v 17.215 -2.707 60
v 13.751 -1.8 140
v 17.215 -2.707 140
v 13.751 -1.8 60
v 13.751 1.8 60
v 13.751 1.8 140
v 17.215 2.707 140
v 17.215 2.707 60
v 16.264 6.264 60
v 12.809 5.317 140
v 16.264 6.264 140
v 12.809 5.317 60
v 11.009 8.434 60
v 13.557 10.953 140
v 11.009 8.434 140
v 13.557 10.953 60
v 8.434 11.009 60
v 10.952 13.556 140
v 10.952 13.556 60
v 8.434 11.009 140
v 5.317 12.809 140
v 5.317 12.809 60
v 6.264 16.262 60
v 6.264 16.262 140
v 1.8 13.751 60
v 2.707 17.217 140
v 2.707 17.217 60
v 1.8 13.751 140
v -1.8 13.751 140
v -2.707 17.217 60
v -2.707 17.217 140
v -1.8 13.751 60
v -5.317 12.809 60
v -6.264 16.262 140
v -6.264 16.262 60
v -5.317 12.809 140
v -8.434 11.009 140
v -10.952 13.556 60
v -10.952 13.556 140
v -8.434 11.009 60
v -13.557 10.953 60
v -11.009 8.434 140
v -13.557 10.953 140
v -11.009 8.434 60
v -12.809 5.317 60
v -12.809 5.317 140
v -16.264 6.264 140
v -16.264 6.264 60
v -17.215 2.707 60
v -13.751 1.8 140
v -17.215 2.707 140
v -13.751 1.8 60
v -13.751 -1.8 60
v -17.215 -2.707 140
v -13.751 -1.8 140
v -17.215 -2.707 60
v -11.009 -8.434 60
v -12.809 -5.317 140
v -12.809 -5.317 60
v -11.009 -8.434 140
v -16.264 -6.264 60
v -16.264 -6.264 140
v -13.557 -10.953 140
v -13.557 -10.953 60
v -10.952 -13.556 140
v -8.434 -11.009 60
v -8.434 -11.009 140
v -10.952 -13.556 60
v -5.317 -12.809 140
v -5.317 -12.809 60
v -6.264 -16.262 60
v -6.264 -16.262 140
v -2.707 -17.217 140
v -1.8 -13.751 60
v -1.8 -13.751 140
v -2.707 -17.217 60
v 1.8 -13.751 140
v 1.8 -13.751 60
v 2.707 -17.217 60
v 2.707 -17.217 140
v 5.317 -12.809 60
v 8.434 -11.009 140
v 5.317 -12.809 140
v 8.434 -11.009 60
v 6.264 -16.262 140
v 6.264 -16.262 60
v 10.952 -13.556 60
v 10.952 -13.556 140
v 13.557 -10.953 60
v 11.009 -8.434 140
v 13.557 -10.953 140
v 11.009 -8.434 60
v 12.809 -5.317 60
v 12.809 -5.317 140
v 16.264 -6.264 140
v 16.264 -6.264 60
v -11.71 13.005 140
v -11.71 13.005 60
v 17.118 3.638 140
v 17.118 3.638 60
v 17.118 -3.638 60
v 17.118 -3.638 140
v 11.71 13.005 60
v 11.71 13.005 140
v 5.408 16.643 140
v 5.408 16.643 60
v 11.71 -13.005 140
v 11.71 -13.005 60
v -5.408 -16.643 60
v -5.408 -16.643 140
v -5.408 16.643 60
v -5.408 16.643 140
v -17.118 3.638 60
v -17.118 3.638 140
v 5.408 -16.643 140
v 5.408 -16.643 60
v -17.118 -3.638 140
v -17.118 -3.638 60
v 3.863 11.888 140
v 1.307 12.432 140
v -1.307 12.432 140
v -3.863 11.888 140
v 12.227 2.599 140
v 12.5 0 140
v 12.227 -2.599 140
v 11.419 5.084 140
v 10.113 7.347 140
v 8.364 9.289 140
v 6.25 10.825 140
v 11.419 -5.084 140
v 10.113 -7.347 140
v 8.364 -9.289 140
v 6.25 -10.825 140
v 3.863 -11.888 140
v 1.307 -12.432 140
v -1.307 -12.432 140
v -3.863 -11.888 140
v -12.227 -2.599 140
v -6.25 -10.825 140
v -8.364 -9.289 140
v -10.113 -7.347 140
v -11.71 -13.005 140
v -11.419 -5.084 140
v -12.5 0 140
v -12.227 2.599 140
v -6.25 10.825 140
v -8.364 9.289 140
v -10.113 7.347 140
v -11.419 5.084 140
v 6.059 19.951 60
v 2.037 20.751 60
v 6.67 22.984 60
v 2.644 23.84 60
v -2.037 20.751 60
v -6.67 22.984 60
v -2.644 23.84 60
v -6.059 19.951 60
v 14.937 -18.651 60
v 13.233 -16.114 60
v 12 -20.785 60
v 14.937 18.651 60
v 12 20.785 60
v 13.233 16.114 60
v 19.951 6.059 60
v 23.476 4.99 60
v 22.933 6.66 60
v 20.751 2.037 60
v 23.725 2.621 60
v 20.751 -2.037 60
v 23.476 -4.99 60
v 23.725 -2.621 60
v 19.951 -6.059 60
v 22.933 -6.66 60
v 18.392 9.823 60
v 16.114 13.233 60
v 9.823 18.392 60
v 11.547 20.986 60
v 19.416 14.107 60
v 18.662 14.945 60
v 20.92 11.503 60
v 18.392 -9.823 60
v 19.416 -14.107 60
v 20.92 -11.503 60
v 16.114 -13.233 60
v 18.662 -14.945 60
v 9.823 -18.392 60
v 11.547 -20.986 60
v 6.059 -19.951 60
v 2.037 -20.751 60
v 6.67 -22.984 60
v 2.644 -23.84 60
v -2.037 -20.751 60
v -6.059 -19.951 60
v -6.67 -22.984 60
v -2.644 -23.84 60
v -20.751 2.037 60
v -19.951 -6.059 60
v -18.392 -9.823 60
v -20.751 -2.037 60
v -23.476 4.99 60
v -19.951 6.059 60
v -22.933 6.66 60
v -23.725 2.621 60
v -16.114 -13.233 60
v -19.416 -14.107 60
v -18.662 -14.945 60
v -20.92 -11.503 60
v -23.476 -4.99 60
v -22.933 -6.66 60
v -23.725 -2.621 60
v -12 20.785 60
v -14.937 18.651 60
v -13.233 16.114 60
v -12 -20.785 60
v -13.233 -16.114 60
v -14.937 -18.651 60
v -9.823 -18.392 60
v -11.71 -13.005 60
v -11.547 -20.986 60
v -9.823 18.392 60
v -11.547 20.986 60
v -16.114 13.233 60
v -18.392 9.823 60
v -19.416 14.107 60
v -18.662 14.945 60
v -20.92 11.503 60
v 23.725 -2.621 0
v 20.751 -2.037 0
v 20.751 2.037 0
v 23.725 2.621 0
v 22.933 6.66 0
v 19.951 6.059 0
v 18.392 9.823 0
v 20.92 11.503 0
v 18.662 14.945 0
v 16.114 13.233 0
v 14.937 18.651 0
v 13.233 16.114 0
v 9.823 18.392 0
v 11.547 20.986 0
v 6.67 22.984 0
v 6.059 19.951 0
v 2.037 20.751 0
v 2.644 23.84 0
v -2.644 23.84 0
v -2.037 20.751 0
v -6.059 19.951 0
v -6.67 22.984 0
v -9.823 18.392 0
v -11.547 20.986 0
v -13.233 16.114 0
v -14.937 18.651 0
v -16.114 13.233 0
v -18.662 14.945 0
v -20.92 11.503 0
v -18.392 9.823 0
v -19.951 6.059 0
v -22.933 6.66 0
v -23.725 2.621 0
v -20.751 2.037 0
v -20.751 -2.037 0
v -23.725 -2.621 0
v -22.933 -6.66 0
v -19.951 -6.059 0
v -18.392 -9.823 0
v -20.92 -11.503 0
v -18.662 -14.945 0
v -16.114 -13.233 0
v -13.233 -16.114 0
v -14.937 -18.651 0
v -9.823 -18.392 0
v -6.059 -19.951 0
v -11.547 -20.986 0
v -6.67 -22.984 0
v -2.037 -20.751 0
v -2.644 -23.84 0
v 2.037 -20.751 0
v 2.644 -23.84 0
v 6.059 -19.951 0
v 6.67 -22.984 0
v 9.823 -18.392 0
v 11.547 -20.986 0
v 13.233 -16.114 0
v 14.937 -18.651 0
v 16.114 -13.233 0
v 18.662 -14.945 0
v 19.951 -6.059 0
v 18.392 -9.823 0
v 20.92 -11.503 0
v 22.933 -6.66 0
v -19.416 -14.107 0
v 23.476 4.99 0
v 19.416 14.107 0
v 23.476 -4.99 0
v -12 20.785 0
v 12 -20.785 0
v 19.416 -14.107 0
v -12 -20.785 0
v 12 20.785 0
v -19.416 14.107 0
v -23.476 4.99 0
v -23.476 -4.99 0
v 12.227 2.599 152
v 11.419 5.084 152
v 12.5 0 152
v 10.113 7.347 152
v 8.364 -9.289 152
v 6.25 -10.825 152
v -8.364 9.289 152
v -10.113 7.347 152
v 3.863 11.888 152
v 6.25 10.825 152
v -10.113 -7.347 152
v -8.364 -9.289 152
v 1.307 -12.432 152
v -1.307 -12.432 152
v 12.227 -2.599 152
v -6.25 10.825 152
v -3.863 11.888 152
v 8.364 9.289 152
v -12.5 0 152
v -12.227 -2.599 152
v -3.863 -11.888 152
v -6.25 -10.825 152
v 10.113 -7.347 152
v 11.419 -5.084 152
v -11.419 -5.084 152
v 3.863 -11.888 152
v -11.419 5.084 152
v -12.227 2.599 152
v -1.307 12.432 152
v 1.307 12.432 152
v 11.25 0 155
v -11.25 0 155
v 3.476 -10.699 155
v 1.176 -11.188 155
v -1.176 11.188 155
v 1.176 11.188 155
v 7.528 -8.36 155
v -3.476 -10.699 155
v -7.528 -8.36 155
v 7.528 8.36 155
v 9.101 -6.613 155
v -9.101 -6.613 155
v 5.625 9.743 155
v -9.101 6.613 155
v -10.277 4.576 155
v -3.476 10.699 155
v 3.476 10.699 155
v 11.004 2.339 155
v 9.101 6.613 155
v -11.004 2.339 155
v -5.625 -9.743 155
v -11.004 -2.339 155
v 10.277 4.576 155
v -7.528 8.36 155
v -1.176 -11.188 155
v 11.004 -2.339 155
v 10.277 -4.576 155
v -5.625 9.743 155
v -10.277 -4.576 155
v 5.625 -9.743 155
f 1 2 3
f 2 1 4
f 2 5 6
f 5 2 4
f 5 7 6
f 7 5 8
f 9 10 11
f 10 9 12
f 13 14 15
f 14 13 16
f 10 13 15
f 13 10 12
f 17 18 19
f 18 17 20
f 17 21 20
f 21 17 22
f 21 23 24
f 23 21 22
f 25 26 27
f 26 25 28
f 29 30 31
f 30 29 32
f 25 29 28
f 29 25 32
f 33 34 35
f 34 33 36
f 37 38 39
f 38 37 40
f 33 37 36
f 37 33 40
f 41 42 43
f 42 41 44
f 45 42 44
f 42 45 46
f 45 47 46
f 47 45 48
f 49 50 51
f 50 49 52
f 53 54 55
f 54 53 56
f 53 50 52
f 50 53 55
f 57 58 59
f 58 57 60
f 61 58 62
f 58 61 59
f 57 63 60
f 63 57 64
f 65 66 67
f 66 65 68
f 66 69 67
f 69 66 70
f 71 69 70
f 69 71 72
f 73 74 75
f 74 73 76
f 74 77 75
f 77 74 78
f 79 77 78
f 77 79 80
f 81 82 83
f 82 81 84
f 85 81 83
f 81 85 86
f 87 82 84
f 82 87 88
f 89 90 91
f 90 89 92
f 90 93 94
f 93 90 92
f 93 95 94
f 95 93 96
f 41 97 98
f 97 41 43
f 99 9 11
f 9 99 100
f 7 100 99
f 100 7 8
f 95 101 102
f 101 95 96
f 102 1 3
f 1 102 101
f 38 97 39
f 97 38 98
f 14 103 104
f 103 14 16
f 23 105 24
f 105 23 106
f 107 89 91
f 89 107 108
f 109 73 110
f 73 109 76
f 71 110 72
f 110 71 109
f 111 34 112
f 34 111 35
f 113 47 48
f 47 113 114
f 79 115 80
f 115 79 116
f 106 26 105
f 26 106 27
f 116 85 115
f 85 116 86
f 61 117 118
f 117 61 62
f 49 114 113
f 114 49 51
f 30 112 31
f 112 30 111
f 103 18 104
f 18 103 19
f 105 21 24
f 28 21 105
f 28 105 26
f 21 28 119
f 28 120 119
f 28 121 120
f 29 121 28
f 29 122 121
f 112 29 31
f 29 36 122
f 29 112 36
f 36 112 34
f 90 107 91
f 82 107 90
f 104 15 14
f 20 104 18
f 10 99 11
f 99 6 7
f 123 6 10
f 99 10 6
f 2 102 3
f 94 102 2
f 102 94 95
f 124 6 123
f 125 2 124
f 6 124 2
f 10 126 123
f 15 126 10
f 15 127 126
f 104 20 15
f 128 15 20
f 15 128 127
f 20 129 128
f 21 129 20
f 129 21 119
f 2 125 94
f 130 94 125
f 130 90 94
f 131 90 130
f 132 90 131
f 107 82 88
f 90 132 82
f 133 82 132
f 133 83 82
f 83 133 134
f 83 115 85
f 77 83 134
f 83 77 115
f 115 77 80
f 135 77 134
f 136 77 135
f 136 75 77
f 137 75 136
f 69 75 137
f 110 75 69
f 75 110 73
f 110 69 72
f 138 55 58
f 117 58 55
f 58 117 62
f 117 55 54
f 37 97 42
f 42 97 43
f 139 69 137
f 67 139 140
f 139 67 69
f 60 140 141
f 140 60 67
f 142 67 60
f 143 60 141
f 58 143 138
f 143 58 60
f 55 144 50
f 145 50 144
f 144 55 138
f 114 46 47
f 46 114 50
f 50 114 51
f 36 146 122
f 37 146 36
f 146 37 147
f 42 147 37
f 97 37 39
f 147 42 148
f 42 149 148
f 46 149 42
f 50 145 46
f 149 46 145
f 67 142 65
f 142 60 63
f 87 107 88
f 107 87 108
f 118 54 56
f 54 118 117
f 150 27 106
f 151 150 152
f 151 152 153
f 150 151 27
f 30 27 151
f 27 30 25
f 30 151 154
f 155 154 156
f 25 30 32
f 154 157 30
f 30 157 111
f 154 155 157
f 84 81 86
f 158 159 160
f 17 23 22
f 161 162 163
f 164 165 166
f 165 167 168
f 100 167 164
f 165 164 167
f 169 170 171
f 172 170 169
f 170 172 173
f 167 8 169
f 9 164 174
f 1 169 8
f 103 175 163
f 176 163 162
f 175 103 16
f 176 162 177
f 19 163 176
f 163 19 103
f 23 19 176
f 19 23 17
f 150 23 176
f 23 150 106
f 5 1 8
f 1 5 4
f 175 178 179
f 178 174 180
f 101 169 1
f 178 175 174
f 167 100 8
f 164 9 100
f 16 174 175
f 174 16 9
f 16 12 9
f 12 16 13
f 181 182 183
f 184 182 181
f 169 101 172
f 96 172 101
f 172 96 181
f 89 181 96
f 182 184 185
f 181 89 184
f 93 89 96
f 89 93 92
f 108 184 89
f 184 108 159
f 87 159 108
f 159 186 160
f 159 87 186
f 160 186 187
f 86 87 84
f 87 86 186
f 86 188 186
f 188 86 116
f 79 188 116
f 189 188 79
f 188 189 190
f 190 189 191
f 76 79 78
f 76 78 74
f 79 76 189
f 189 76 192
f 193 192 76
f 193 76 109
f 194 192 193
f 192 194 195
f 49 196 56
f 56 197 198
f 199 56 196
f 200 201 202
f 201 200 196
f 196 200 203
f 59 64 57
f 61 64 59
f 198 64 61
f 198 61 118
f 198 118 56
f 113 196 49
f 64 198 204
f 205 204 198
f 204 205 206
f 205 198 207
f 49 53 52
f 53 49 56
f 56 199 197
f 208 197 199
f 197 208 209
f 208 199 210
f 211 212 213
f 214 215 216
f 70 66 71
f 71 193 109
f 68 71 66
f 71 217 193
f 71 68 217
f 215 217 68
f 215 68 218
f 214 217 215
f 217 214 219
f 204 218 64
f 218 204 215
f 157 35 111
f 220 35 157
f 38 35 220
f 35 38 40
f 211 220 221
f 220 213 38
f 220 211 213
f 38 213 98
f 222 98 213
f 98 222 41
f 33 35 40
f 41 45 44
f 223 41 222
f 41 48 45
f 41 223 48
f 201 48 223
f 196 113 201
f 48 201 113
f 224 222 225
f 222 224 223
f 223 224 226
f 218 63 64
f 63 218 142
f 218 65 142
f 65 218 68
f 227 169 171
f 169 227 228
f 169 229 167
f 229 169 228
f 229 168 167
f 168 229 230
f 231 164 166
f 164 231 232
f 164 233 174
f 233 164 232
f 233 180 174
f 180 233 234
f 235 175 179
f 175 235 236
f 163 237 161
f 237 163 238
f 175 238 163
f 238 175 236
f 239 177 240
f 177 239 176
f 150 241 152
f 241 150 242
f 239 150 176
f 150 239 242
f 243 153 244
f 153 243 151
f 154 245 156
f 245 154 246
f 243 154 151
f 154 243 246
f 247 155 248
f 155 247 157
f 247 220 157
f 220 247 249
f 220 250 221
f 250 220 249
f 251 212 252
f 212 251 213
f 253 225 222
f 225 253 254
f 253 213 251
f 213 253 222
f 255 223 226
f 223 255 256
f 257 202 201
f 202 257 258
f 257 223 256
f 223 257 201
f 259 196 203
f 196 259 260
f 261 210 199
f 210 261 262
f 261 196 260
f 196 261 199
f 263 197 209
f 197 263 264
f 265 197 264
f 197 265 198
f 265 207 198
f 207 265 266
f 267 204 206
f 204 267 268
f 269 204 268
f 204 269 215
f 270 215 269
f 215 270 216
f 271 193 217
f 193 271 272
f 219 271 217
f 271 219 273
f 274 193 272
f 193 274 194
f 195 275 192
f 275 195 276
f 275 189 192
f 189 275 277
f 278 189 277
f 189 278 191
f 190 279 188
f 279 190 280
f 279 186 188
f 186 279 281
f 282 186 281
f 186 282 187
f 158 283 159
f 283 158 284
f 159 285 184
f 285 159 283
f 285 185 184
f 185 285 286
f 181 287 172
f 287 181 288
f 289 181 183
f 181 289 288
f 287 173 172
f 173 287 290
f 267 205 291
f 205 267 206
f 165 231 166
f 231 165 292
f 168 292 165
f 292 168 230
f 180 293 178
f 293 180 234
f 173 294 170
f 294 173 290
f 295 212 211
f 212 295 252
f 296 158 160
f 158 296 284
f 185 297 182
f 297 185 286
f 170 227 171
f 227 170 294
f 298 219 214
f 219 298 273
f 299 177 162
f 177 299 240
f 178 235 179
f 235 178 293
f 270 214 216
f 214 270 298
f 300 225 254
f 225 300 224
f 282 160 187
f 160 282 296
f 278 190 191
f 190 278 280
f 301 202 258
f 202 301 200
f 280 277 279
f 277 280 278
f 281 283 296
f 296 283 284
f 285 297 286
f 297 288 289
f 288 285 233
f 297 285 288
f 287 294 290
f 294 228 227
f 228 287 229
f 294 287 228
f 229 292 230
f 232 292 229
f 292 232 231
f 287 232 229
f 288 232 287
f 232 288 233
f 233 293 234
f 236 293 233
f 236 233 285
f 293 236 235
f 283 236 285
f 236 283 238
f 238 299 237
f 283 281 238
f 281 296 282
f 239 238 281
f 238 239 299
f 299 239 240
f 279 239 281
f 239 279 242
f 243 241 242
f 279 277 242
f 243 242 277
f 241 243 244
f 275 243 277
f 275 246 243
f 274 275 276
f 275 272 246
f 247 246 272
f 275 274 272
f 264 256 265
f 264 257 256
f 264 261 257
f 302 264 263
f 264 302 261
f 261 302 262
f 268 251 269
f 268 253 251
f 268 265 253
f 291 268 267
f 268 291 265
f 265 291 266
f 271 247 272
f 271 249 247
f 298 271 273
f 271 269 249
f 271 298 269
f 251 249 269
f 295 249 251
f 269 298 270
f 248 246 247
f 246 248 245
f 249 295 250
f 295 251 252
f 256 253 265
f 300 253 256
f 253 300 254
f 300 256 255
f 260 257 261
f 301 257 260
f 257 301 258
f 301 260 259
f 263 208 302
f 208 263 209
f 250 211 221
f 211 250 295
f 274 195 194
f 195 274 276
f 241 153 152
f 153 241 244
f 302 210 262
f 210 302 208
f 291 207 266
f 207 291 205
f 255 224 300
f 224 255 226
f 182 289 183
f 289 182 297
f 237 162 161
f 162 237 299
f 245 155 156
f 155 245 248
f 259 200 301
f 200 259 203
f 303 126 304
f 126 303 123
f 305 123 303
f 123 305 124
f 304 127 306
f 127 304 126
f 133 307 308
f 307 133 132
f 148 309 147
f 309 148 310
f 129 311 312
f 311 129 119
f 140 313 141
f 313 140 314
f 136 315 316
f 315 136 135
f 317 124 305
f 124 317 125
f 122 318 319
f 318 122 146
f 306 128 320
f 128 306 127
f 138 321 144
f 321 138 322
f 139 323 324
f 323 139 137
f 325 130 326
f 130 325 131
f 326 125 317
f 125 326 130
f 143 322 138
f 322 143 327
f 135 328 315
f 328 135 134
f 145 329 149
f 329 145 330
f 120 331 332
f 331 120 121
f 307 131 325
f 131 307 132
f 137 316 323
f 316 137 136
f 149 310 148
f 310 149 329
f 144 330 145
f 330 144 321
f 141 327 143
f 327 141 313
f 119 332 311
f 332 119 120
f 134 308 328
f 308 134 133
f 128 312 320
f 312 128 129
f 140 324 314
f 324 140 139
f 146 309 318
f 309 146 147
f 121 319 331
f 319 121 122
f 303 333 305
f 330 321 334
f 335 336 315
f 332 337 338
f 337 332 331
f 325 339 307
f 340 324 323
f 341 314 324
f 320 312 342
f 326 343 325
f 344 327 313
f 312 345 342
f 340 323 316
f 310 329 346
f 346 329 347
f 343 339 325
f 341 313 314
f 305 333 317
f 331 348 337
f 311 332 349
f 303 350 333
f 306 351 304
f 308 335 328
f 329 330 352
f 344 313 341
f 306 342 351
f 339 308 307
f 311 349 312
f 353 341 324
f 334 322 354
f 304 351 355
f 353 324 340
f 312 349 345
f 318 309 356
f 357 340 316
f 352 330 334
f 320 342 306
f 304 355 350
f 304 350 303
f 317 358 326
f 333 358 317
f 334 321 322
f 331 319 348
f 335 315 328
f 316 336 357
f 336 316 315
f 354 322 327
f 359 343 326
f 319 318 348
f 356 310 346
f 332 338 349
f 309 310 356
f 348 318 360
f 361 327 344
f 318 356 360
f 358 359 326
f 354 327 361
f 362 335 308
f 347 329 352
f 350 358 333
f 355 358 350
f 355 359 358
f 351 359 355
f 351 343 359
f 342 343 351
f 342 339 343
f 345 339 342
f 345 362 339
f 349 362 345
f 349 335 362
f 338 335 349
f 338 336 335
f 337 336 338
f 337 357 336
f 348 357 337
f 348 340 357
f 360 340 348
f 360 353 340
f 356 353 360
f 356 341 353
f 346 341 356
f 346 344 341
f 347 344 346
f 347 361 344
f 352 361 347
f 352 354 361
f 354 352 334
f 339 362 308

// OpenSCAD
// This one better be as fit as possible
spline_major=35;
spline_minor=27.5;
spline_count=12;
// Belarus 1523.4 spline length 78mm
spline_length=80;

spline2_major=48;
spline2_minor=41.5;
spline2_count=16;
// Belarus 1523.4 spline2 length 30mm, but we need more as handle
spline2_length=60;


// Bearing iD = 25
pilot_diam=25;
pilot_guide_length_percent=20;
pilot_length=15;

// Not really useful for 1523.4
handle_length=0;

total_length = spline2_length+spline_length+handle_length+pilot_length;
echo (concat("Total length: ", total_length));

// 1523.4 clutch mechanism (splines) is about 110mm in length
usable_length = spline2_length+spline_length;
echo (concat("Total spline length: ", usable_length));

// HANDLE
cylinder(r=spline2_major/2, h=handle_length);

// BOTTOM SPLINE
translate([0,0,handle_length+spline2_length])
    spline(spline_major, spline_minor, spline_count, spline_length);
// TOP SPLINE
translate([0,0,handle_length])
    spline(spline2_major, spline2_minor, spline2_count, spline2_length);

// PILOT GENERATION
offset_pilot=handle_length+spline2_length+spline_length;
translate([0,0,offset_pilot])
     cylinder(r=pilot_diam/2, h=pilot_length*(1-pilot_guide_length_percent*0.01));
translate([0,0,offset_pilot+pilot_length*(1-pilot_guide_length_percent*0.01)])
     cylinder(r1=pilot_diam/2, r2=0.9*pilot_diam/2, h=pilot_length*(pilot_guide_length_percent*0.01));  
	

module spline(spline_major=45, spline_minor=40, spline_count=20, spline_length=10){
    spline_depth=(spline_major-spline_minor)/2;
    major_circumference=3.14159*spline_major;
    minor_circumference=3.14159*spline_minor;
    
    spline_bottom_width=minor_circumference/(spline_count*2);
    spline_width=(major_circumference-(spline_bottom_width*spline_count))/spline_count;
    
    union() {
		difference() {
			cylinder(r=spline_major/2, h=spline_length);
			
			for (c=[0:spline_count])
				rotate([0,0,c*360/spline_count])
					translate([spline_minor/2+0.001,0,-0.5])
						linear_extrude(height=spline_length+1)
							polygon(points=[[0,-spline_bottom_width/2],[spline_depth,-spline_width/2],[spline_depth,spline_width/2],[0,spline_bottom_width/2]]);				
		}		
	}
}
